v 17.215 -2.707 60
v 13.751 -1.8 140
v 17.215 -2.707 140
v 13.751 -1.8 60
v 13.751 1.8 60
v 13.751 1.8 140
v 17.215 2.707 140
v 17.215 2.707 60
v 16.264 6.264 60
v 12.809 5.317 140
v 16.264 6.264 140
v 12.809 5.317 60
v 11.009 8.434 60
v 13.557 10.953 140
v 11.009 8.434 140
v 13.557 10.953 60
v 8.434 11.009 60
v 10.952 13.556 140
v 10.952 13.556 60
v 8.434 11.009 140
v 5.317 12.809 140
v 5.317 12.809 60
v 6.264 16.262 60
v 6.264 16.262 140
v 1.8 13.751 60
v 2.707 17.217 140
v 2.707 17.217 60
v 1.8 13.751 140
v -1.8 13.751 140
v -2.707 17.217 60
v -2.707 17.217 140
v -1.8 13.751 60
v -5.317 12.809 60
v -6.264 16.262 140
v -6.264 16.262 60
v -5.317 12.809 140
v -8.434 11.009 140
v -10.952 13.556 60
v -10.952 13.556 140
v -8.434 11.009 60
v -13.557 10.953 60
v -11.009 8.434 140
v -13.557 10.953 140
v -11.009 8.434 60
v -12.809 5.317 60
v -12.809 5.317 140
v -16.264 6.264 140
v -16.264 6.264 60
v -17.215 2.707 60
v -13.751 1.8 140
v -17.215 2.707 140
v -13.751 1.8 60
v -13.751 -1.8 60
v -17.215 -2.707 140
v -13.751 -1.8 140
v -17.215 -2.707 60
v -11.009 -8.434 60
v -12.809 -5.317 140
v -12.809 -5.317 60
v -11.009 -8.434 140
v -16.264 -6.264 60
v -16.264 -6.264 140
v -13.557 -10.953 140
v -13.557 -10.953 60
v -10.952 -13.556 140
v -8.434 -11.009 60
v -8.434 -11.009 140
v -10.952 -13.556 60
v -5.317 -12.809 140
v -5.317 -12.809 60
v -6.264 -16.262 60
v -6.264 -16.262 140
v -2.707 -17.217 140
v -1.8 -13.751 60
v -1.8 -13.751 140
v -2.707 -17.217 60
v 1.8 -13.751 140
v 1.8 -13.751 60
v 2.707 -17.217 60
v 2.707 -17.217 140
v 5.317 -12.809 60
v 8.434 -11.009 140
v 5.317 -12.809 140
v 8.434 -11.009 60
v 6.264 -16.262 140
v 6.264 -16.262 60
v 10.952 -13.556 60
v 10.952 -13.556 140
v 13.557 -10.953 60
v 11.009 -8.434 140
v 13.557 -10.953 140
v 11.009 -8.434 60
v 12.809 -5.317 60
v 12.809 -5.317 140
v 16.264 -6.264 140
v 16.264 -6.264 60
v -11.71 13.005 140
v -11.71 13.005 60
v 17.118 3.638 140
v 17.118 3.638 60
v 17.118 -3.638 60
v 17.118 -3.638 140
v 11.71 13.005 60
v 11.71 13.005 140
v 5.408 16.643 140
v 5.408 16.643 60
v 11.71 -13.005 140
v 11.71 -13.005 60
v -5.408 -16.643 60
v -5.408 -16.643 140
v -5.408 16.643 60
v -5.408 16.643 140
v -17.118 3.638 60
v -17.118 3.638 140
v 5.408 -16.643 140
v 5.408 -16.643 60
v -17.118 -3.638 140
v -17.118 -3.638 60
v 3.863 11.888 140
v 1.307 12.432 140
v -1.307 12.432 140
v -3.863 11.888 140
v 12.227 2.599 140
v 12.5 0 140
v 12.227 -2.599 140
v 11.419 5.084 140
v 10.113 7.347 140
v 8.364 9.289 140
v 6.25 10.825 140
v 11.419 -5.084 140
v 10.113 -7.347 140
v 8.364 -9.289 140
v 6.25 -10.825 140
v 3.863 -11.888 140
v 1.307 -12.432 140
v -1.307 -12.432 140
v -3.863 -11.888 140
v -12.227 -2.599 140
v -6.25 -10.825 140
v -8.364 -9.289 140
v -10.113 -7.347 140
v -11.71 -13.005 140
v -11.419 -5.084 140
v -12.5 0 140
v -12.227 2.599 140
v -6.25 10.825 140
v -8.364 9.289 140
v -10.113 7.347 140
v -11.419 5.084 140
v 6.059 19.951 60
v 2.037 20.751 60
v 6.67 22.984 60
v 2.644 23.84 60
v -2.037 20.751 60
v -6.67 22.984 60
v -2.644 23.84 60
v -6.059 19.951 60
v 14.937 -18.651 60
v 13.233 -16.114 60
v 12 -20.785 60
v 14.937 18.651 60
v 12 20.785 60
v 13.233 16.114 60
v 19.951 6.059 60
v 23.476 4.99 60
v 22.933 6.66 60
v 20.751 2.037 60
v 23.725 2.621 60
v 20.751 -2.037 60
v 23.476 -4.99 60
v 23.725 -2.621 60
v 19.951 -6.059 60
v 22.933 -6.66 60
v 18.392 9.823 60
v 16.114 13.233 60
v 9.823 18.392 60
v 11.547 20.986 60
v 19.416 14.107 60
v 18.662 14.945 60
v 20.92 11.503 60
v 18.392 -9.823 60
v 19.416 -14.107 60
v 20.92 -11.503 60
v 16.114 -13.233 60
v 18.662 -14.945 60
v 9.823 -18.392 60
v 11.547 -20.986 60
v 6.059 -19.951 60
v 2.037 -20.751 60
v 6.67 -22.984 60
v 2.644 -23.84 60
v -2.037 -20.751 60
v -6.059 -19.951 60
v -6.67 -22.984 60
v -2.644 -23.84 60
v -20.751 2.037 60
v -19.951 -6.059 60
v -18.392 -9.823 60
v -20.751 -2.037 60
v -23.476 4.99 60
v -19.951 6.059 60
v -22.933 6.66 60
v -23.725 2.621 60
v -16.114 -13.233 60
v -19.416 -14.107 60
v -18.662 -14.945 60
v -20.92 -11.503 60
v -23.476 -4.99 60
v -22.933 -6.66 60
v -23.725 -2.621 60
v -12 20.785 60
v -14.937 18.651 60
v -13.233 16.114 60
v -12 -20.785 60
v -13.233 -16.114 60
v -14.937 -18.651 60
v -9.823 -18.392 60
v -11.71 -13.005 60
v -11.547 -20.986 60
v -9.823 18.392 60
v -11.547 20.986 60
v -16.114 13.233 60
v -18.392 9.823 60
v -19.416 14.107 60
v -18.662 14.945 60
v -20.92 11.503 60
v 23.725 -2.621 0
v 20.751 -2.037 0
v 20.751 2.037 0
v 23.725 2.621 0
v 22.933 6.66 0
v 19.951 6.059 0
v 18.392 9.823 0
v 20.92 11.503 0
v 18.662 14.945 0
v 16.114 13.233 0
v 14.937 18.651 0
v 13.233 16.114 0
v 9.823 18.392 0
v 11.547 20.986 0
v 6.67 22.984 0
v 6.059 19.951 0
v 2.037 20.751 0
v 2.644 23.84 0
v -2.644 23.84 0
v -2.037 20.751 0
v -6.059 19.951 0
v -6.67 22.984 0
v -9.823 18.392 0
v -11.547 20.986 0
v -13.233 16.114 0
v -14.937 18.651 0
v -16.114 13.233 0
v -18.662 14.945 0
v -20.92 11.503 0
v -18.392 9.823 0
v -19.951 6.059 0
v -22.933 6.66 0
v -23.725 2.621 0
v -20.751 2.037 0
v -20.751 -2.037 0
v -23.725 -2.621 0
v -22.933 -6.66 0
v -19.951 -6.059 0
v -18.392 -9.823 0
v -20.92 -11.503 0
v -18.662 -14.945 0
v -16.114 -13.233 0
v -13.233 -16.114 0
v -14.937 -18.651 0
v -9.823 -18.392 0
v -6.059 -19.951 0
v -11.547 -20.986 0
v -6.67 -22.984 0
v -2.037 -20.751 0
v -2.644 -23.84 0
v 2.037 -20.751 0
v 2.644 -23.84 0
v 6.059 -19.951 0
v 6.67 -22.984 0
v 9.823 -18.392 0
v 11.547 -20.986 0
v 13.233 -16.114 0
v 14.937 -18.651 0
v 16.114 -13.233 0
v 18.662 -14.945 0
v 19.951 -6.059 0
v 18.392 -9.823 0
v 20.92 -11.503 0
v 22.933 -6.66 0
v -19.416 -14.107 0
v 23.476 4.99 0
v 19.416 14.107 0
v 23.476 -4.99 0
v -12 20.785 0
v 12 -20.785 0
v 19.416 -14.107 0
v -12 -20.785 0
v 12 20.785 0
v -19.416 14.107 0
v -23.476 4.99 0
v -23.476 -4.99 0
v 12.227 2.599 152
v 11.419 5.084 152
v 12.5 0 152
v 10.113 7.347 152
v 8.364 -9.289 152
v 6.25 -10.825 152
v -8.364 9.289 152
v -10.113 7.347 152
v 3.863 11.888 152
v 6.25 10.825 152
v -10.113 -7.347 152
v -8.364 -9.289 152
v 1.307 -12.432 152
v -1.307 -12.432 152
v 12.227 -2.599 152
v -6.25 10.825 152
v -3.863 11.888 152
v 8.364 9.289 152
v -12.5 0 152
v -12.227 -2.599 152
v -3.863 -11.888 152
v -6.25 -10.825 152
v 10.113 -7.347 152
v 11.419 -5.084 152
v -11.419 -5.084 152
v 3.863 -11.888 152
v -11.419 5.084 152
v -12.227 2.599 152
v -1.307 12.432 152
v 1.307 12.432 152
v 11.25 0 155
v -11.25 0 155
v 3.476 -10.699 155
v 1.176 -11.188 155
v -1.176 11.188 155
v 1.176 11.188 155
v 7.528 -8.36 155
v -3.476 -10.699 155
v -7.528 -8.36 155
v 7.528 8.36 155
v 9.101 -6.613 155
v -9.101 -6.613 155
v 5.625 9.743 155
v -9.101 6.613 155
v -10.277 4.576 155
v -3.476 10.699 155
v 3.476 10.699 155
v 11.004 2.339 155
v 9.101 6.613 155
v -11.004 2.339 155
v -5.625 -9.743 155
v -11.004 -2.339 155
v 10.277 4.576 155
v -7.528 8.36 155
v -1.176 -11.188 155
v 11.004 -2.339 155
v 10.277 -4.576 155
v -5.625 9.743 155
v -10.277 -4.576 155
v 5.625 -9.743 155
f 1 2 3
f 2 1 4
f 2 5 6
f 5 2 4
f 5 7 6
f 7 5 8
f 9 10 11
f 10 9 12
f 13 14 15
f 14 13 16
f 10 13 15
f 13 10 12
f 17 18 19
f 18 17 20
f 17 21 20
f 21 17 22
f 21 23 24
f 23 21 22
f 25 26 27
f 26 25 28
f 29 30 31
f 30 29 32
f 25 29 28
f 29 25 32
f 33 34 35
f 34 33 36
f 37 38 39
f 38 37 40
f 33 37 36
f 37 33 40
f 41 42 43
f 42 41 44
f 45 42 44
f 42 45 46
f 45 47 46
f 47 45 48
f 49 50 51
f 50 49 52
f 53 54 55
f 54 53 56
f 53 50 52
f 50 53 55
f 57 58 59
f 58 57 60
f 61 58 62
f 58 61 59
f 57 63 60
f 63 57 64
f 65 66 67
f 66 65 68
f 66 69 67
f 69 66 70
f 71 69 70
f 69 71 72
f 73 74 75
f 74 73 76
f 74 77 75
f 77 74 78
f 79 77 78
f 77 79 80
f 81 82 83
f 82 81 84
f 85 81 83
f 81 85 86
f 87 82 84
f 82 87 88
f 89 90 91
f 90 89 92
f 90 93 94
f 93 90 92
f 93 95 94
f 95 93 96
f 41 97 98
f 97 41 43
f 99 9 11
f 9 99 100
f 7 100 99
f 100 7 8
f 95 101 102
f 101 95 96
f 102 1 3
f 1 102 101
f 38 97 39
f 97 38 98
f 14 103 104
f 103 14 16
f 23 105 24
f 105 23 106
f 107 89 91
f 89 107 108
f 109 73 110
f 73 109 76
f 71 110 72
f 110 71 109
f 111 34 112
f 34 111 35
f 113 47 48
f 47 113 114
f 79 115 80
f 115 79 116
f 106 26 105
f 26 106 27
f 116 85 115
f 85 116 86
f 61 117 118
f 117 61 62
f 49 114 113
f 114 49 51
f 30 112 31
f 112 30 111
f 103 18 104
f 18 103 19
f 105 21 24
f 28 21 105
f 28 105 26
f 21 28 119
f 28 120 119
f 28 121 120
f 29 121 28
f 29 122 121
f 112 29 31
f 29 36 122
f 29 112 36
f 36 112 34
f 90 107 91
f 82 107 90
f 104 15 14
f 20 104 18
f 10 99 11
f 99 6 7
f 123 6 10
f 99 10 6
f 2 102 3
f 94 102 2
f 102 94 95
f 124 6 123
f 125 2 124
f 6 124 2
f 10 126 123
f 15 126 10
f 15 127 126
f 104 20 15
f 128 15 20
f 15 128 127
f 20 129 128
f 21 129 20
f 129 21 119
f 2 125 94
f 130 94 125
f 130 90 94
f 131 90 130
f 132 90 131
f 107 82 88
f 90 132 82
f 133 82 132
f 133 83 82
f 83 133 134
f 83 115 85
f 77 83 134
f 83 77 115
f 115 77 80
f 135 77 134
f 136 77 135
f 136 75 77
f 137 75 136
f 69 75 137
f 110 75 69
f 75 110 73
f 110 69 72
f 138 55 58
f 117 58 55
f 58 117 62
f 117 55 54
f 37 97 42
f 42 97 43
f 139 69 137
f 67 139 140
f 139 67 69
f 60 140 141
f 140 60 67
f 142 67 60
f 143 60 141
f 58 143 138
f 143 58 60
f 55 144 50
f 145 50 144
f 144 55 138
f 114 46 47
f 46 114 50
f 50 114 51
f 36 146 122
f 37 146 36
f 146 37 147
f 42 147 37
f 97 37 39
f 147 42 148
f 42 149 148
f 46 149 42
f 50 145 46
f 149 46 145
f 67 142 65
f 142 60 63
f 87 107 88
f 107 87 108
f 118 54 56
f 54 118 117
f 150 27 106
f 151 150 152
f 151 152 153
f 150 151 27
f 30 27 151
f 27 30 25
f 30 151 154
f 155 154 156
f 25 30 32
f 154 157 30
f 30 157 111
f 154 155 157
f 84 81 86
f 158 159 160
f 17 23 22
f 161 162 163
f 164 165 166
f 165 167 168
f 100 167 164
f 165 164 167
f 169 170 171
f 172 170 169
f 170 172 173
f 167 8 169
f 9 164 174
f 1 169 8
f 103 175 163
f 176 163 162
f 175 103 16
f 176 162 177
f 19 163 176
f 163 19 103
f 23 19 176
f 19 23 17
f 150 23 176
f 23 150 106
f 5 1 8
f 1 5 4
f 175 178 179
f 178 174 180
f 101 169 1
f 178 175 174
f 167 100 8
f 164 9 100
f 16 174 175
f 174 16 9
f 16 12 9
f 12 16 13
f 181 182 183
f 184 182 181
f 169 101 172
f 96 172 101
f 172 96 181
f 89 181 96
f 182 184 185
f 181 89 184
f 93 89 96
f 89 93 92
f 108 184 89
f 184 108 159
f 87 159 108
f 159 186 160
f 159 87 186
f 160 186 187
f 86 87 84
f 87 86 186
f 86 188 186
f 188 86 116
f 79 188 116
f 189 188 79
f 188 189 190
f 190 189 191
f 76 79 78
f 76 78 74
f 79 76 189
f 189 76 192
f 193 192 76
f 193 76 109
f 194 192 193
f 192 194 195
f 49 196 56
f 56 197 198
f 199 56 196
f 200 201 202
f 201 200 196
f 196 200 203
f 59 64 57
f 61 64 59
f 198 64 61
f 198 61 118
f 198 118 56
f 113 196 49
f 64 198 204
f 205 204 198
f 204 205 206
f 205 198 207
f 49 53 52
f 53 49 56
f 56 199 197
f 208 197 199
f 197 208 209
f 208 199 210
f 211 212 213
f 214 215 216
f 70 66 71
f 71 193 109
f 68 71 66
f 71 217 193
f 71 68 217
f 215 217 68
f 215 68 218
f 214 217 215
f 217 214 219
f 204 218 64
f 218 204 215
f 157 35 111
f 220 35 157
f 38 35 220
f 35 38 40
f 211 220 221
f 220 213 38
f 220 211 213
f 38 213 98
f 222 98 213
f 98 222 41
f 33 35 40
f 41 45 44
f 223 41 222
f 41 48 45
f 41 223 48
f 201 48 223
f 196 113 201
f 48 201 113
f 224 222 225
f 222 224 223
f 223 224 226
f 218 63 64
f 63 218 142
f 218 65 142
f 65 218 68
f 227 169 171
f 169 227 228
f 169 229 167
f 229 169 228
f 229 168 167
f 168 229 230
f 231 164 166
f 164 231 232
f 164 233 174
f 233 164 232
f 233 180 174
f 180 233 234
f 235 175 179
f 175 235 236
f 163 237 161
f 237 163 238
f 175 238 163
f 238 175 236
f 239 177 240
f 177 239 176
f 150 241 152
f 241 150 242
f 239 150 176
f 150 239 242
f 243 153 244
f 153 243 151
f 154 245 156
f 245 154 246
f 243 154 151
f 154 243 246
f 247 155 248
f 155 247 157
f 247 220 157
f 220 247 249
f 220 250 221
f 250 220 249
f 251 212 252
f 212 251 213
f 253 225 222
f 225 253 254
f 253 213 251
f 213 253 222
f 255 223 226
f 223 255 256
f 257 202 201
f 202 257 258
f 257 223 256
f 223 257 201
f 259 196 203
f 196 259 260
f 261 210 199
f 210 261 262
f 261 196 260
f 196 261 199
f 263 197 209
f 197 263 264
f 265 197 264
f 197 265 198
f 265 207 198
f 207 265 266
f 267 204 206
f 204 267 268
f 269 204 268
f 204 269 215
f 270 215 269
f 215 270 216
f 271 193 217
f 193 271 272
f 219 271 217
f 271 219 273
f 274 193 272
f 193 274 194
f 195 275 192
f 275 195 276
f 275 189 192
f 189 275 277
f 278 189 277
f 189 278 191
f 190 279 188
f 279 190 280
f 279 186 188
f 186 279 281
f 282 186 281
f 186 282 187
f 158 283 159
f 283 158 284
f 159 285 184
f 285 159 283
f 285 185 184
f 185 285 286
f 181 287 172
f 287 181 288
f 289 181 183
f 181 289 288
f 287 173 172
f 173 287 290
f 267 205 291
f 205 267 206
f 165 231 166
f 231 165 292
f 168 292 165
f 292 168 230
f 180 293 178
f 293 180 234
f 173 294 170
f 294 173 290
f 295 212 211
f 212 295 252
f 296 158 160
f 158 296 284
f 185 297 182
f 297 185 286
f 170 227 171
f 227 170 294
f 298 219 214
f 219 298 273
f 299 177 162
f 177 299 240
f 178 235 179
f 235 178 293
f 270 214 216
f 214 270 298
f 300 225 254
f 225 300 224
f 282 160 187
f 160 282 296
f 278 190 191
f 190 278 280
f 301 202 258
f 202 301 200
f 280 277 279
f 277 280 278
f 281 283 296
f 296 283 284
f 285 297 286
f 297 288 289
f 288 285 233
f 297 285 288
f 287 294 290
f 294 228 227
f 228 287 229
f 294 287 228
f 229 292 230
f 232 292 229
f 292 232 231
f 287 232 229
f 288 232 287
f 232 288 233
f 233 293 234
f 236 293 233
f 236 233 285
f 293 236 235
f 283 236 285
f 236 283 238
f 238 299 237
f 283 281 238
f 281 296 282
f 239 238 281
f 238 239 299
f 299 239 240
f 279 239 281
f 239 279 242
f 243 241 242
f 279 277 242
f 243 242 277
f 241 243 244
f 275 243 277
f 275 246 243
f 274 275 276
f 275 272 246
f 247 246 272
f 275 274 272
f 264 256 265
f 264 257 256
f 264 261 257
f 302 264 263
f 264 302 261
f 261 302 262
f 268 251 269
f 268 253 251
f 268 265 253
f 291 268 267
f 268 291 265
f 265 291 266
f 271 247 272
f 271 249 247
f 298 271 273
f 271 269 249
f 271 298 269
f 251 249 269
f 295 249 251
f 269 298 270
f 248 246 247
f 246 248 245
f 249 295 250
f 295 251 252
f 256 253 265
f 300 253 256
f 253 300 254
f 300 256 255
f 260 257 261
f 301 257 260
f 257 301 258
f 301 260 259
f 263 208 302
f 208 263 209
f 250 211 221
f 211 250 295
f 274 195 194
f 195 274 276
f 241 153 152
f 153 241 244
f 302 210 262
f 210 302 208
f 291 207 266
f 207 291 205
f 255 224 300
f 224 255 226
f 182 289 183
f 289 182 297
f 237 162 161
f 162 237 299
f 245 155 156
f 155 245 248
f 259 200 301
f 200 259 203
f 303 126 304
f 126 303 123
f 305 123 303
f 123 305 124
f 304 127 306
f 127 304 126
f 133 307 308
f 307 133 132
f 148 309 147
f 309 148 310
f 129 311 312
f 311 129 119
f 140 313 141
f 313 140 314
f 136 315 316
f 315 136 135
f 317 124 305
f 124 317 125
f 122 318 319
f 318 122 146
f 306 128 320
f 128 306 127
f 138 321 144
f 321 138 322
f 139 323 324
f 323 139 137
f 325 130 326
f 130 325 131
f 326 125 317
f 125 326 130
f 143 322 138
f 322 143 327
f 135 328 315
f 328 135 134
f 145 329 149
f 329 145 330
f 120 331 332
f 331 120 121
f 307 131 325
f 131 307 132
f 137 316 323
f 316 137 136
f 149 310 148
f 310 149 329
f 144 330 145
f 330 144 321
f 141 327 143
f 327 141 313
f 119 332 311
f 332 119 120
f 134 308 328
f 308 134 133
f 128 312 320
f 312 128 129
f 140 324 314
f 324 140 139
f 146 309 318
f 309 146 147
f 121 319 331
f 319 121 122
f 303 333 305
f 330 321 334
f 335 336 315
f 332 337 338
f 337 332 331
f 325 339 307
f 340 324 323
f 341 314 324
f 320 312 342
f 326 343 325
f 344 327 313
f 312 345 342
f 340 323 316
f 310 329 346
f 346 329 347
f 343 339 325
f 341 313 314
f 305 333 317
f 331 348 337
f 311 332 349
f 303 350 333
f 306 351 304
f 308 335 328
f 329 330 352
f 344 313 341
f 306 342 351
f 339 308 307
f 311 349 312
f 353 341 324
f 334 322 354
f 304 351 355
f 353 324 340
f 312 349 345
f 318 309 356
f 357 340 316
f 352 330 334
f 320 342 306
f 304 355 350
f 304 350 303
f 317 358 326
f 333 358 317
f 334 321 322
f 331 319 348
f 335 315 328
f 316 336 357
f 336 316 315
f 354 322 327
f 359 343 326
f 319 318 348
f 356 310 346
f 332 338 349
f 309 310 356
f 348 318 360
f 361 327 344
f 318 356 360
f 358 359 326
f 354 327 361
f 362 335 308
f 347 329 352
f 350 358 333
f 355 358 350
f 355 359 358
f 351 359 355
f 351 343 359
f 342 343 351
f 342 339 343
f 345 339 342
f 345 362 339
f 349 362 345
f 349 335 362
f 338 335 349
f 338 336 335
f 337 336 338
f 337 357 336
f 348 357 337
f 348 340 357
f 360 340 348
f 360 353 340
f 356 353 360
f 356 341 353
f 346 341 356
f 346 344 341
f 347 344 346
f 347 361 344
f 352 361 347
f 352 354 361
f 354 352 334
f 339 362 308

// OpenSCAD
// This one better be as fit as possible
spline_major=35;
spline_minor=27.5;
spline_count=12;
// Belarus 1523.4 spline length 78mm
spline_length=80;

spline2_major=48;
spline2_minor=41.5;
spline2_count=16;
// Belarus 1523.4 spline2 length 30mm, but we need more as handle
spline2_length=60;


// Bearing iD = 25
pilot_diam=25;
pilot_guide_length_percent=20;
pilot_length=15;

// Not really useful for 1523.4
handle_length=0;

total_length = spline2_length+spline_length+handle_length+pilot_length;
echo (concat("Total length: ", total_length));

// 1523.4 clutch mechanism (splines) is about 110mm in length
usable_length = spline2_length+spline_length;
echo (concat("Total spline length: ", usable_length));

// HANDLE
cylinder(r=spline2_major/2, h=handle_length);

// BOTTOM SPLINE
translate([0,0,handle_length+spline2_length])
    spline(spline_major, spline_minor, spline_count, spline_length);
// TOP SPLINE
translate([0,0,handle_length])
    spline(spline2_major, spline2_minor, spline2_count, spline2_length);

// PILOT GENERATION
offset_pilot=handle_length+spline2_length+spline_length;
translate([0,0,offset_pilot])
     cylinder(r=pilot_diam/2, h=pilot_length*(1-pilot_guide_length_percent*0.01));
translate([0,0,offset_pilot+pilot_length*(1-pilot_guide_length_percent*0.01)])
     cylinder(r1=pilot_diam/2, r2=0.9*pilot_diam/2, h=pilot_length*(pilot_guide_length_percent*0.01));  
	

module spline(spline_major=45, spline_minor=40, spline_count=20, spline_length=10){
    spline_depth=(spline_major-spline_minor)/2;
    major_circumference=3.14159*spline_major;
    minor_circumference=3.14159*spline_minor;
    
    spline_bottom_width=minor_circumference/(spline_count*2);
    spline_width=(major_circumference-(spline_bottom_width*spline_count))/spline_count;
    
    union() {
		difference() {
			cylinder(r=spline_major/2, h=spline_length);
			
			for (c=[0:spline_count])
				rotate([0,0,c*360/spline_count])
					translate([spline_minor/2+0.001,0,-0.5])
						linear_extrude(height=spline_length+1)
							polygon(points=[[0,-spline_bottom_width/2],[spline_depth,-spline_width/2],[spline_depth,spline_width/2],[0,spline_bottom_width/2]]);				
		}		
	}
}
